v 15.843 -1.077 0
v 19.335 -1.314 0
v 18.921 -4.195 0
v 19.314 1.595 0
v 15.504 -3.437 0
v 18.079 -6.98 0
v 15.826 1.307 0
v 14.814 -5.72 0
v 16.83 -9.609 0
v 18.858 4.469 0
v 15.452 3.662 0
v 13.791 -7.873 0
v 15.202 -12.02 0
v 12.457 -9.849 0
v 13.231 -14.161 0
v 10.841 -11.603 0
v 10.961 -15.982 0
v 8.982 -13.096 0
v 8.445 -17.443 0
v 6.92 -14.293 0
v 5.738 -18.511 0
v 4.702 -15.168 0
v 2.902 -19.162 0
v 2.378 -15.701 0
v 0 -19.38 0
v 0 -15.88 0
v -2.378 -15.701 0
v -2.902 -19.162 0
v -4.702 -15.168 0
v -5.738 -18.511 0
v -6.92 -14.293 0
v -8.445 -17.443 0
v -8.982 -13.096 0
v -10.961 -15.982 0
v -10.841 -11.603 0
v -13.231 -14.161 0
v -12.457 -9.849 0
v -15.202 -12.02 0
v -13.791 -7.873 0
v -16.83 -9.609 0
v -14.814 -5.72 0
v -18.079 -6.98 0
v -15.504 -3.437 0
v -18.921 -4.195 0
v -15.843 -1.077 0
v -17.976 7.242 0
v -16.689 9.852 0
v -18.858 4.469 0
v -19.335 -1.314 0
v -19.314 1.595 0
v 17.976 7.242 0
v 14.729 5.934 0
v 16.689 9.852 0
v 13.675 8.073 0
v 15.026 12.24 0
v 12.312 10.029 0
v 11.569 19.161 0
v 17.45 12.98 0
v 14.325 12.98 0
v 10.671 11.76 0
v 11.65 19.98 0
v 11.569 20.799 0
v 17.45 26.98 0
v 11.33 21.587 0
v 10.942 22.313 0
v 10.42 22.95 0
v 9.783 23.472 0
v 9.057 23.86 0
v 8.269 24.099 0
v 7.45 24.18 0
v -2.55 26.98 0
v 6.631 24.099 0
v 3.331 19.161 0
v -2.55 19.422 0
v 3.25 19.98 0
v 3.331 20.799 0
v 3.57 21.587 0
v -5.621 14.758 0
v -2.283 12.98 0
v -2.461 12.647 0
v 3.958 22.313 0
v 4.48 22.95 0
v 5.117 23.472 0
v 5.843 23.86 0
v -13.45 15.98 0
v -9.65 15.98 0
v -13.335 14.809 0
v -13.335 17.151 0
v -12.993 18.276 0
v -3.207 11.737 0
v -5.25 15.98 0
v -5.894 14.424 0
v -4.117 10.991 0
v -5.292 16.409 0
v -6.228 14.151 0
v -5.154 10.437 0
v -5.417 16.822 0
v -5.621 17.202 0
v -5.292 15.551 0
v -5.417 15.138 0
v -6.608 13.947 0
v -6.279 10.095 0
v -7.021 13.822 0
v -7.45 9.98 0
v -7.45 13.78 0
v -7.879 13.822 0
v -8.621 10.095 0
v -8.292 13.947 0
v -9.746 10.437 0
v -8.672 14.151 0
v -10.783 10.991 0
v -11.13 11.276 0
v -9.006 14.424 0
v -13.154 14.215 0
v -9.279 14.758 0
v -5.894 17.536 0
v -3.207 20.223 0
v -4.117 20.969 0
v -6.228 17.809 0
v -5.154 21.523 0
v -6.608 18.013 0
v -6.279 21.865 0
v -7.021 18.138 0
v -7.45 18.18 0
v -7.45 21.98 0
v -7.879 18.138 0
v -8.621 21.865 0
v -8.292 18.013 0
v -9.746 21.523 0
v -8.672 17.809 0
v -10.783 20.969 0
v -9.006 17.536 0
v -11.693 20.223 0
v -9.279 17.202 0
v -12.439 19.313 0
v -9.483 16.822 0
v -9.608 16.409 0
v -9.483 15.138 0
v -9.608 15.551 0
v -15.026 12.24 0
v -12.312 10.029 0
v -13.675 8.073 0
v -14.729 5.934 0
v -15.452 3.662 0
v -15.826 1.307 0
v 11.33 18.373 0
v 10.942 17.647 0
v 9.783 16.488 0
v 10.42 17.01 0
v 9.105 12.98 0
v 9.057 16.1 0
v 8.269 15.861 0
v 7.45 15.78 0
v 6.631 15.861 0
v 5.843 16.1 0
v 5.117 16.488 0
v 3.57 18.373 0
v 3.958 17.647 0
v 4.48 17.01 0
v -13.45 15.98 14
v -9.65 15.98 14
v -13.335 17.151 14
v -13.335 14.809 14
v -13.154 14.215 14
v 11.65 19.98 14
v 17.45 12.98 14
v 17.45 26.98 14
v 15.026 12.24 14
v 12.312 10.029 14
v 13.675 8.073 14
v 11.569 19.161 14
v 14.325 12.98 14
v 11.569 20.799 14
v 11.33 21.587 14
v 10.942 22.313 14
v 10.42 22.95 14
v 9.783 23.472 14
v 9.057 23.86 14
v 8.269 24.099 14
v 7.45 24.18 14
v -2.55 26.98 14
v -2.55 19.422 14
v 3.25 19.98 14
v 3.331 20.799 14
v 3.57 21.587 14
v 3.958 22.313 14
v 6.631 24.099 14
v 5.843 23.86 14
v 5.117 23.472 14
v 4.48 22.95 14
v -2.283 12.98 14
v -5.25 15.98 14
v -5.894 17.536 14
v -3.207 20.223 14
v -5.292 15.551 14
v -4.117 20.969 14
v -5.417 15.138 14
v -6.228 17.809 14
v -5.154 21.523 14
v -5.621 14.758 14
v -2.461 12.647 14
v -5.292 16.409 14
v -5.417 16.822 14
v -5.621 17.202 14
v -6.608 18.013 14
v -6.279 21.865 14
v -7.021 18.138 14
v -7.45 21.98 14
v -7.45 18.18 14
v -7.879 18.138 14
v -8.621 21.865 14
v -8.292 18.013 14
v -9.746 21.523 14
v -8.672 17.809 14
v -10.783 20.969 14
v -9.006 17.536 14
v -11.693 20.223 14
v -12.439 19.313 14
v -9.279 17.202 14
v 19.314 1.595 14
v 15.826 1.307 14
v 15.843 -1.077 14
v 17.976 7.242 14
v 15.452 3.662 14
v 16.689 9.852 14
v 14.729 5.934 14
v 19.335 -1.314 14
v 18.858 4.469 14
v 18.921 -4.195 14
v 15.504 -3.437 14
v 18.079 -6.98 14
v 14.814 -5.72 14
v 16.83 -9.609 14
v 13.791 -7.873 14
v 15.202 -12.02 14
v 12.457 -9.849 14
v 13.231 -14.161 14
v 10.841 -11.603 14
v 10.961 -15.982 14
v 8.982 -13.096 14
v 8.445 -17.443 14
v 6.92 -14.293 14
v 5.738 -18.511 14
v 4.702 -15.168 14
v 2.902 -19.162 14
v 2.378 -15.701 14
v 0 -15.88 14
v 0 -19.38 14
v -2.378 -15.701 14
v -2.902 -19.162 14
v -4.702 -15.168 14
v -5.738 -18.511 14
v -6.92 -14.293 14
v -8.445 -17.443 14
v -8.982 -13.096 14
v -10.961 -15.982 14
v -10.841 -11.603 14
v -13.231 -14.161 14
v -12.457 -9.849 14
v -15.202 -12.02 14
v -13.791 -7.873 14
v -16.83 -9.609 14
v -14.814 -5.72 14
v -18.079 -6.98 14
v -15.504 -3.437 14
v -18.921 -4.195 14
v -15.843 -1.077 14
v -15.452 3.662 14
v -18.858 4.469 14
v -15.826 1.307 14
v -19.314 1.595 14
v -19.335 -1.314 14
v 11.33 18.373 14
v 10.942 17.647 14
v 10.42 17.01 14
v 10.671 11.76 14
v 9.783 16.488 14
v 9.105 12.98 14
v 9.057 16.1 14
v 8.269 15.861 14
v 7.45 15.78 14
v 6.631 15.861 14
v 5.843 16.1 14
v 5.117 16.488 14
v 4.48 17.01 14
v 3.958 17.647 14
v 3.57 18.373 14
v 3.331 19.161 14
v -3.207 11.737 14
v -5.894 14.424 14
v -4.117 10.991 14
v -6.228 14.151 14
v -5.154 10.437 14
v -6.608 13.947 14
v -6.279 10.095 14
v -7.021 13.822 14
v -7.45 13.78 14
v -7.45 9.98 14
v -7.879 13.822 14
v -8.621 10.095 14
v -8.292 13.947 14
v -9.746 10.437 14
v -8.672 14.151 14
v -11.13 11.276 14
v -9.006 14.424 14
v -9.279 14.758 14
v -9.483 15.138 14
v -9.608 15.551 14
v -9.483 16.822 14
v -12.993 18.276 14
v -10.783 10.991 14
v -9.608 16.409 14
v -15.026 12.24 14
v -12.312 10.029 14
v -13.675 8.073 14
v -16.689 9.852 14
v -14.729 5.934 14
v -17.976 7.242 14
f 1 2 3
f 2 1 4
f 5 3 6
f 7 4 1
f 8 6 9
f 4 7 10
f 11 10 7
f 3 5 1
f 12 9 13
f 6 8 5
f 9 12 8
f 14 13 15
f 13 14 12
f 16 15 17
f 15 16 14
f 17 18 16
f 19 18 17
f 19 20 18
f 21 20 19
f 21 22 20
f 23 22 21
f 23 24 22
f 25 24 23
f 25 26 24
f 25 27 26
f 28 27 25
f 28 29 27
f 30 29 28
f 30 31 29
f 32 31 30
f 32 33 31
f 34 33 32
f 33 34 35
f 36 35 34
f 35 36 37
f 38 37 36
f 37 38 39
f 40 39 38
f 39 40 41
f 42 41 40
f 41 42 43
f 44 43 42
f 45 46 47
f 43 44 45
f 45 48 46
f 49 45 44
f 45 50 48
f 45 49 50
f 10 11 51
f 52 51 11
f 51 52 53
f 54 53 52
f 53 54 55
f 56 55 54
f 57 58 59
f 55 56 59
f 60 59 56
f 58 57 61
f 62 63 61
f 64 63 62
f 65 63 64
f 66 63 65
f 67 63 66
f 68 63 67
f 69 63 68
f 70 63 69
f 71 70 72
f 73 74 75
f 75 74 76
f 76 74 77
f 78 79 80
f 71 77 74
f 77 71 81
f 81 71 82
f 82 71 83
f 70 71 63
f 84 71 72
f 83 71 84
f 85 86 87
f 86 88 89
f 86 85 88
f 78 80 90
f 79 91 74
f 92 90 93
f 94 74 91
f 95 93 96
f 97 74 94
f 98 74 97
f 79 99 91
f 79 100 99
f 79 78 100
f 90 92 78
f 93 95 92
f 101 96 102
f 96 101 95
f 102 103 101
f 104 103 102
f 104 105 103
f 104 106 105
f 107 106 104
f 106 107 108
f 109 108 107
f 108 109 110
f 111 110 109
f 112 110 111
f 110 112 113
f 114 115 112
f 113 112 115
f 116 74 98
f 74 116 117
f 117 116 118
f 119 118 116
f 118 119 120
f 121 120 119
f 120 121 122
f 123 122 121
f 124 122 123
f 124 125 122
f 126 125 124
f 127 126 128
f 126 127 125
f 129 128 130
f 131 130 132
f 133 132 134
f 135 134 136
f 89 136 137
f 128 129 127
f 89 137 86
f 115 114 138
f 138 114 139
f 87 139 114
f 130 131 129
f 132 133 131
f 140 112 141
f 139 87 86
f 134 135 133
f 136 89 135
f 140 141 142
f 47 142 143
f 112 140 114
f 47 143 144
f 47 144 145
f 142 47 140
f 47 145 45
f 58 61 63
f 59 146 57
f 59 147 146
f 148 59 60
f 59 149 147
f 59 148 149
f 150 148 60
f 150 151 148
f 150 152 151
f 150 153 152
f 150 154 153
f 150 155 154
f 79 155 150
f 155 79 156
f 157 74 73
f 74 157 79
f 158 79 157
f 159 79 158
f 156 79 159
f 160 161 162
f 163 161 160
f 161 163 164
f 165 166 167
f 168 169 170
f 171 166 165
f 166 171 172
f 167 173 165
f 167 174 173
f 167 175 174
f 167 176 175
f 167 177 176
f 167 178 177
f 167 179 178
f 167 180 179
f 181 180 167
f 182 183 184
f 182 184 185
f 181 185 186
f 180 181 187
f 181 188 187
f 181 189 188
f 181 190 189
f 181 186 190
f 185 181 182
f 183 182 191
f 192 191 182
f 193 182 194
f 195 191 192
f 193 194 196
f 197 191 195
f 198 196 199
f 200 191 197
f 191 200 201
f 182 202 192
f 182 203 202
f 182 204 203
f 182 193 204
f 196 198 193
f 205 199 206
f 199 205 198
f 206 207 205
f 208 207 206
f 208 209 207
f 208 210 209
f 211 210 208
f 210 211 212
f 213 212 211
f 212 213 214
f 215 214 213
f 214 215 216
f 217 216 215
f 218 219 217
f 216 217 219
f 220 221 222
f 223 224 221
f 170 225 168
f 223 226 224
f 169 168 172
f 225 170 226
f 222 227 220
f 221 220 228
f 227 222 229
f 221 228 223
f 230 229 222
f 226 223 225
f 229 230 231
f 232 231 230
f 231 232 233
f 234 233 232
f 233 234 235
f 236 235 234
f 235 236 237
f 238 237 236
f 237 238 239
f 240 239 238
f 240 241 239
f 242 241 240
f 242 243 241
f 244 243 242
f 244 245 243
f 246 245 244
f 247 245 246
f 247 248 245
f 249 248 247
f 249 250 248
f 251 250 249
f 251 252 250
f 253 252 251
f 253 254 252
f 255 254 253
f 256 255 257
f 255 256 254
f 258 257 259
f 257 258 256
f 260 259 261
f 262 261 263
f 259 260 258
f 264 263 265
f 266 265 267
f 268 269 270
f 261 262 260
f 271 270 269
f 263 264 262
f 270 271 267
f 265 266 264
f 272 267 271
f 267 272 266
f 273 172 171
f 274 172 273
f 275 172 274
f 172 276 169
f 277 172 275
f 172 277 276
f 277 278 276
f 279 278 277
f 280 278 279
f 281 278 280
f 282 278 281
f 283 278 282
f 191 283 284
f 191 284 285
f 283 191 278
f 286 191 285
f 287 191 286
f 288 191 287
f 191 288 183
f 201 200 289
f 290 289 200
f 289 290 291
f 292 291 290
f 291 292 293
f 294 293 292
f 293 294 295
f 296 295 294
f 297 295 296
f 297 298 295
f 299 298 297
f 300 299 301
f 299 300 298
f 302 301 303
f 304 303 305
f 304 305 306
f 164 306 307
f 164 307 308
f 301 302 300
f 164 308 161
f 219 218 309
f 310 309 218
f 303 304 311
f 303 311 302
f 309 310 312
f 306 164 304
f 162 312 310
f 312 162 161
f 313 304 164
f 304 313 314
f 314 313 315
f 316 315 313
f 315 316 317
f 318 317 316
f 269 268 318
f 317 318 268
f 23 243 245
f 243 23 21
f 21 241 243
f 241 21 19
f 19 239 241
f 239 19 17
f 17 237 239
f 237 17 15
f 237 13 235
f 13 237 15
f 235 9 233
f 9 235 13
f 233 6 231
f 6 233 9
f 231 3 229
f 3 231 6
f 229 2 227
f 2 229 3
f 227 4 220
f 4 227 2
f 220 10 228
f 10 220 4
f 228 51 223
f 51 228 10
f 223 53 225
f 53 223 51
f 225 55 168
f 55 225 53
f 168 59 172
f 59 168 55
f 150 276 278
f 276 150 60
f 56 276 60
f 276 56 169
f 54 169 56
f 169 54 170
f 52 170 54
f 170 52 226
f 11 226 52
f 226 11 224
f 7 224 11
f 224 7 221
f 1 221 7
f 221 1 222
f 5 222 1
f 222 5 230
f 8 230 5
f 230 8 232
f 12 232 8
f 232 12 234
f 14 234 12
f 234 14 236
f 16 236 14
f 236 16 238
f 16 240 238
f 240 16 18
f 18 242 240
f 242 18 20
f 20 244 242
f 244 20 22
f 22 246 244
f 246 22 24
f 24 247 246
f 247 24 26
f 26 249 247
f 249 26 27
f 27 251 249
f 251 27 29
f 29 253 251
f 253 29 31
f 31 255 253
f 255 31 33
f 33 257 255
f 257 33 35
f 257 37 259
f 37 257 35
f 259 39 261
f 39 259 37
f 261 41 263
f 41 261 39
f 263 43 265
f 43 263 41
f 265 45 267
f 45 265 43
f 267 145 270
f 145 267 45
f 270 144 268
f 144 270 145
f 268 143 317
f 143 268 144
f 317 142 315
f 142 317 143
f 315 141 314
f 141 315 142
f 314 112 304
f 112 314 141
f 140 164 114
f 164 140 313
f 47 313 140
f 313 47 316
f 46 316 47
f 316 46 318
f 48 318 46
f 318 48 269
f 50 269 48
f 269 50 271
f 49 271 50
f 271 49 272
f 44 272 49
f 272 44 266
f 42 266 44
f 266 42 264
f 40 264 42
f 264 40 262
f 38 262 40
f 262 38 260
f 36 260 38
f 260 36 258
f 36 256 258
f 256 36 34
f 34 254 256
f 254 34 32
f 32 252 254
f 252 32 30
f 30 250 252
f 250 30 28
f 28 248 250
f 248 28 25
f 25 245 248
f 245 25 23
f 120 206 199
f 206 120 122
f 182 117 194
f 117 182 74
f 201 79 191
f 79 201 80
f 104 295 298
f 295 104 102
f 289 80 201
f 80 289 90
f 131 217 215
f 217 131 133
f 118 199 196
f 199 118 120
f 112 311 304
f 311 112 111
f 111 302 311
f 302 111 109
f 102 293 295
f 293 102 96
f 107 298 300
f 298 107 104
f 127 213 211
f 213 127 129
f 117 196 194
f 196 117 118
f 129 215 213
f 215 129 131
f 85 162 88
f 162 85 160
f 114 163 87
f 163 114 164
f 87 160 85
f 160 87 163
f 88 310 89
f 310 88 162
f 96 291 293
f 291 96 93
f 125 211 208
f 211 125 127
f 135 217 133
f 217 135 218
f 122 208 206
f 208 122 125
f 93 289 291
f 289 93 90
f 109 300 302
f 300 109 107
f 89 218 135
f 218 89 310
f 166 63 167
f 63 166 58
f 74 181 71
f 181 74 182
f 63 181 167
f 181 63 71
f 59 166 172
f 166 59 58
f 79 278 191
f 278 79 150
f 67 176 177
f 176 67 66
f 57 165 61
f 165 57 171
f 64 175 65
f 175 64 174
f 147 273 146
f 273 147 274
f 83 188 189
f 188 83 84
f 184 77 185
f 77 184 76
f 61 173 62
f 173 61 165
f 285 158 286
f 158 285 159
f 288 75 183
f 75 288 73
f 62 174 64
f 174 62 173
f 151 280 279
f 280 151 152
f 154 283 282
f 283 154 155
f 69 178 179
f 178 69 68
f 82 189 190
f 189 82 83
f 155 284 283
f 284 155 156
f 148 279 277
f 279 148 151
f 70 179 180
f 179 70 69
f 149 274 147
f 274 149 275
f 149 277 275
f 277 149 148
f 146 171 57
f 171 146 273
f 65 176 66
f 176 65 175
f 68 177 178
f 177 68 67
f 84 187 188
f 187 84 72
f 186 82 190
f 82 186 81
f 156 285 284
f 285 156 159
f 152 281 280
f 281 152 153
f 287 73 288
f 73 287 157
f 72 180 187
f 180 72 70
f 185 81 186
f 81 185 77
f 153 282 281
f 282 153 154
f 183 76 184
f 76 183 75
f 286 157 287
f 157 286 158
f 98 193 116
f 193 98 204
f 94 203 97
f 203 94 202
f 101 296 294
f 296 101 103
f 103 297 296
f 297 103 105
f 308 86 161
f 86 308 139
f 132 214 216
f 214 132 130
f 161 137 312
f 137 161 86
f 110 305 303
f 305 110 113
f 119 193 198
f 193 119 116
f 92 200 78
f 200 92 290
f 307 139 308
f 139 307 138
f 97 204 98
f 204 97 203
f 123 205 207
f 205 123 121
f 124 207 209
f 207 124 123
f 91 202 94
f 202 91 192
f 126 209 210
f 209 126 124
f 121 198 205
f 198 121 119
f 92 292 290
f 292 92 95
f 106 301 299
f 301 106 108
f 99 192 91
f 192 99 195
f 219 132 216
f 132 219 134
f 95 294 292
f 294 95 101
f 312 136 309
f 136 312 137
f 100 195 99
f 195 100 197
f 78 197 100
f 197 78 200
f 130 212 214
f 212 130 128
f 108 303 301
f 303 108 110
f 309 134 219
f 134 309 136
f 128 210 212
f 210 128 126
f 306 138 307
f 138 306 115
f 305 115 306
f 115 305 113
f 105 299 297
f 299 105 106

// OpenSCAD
$fn = 32;

// ----------------------------------------------------------------------
// Pipe clamp: 38.76 mm ring, 3.5 mm wall, 14 mm wide
// ----------------------------------------------------------------------

// --- parameters (mm) ---
outer_r = 19.38;          // clamp outside radius
inner_r = 15.88;          // pipe bore radius
band = 3.5;               // band thickness
clamp_w = 14;             // clamp width
opening = 50;             // opening angle between the ends
lug_w = 20;               // lug width
lug_len = 14;             // lug length
bolt_d = 8.4;             // bolt hole
knuckle_d = 12;           // hinge knuckle diameter
pin_d = 4.4;              // hinge pin hole

clamp_profile = [[-8.19, 17.564], [-10.728, 16.14], [-13.024, 14.352], [-15.026, 12.24], [-16.689, 9.852], [-17.976, 7.242], [-18.858, 4.469], [-19.314, 1.595], [-19.335, -1.314], [-18.921, -4.195], [-18.079, -6.98], [-16.83, -9.609], [-15.202, -12.02], [-13.231, -14.161], [-10.961, -15.982], [-8.445, -17.443], [-5.738, -18.511], [-2.902, -19.162], [0, -19.38], [2.902, -19.162], [5.738, -18.511], [8.445, -17.443], [10.961, -15.982], [13.231, -14.161], [15.202, -12.02], [16.83, -9.609], [18.079, -6.98], [18.921, -4.195], [19.335, -1.314], [19.314, 1.595], [18.858, 4.469], [17.976, 7.242], [16.689, 9.852], [15.026, 12.24], [13.024, 14.352], [10.728, 16.14], [8.19, 17.564], [6.711, 14.392], [8.79, 13.225], [10.671, 11.76], [12.312, 10.029], [13.675, 8.073], [14.729, 5.934], [15.452, 3.662], [15.826, 1.307], [15.843, -1.077], [15.504, -3.437], [14.814, -5.72], [13.791, -7.873], [12.457, -9.849], [10.841, -11.603], [8.982, -13.096], [6.92, -14.293], [4.702, -15.168], [2.378, -15.701], [0, -15.88], [-2.378, -15.701], [-4.702, -15.168], [-6.92, -14.293], [-8.982, -13.096], [-10.841, -11.603], [-12.457, -9.849], [-13.791, -7.873], [-14.814, -5.72], [-15.504, -3.437], [-15.843, -1.077], [-15.826, 1.307], [-15.452, 3.662], [-14.729, 5.934], [-13.675, 8.073], [-12.312, 10.029], [-10.671, 11.76], [-8.79, 13.225], [-6.711, 14.392]];

difference() {
  union() {
    linear_extrude(height = clamp_w) polygon(clamp_profile);
    /* hinge knuckle, sunk 2 mm into the band end */
    translate([-7.45, 15.98, 0]) cylinder(h = clamp_w, d = knuckle_d);
    /* bolt lug on the other end */
    translate([-2.55, 12.98, 0]) cube([lug_w, 14, clamp_w]);
  }
  translate([7.45, 19.98, -2.5]) cylinder(h = clamp_w + 5, d = bolt_d);
  translate([-7.45, 15.98, -2.5]) cylinder(h = clamp_w + 5, d = pin_d);
}
